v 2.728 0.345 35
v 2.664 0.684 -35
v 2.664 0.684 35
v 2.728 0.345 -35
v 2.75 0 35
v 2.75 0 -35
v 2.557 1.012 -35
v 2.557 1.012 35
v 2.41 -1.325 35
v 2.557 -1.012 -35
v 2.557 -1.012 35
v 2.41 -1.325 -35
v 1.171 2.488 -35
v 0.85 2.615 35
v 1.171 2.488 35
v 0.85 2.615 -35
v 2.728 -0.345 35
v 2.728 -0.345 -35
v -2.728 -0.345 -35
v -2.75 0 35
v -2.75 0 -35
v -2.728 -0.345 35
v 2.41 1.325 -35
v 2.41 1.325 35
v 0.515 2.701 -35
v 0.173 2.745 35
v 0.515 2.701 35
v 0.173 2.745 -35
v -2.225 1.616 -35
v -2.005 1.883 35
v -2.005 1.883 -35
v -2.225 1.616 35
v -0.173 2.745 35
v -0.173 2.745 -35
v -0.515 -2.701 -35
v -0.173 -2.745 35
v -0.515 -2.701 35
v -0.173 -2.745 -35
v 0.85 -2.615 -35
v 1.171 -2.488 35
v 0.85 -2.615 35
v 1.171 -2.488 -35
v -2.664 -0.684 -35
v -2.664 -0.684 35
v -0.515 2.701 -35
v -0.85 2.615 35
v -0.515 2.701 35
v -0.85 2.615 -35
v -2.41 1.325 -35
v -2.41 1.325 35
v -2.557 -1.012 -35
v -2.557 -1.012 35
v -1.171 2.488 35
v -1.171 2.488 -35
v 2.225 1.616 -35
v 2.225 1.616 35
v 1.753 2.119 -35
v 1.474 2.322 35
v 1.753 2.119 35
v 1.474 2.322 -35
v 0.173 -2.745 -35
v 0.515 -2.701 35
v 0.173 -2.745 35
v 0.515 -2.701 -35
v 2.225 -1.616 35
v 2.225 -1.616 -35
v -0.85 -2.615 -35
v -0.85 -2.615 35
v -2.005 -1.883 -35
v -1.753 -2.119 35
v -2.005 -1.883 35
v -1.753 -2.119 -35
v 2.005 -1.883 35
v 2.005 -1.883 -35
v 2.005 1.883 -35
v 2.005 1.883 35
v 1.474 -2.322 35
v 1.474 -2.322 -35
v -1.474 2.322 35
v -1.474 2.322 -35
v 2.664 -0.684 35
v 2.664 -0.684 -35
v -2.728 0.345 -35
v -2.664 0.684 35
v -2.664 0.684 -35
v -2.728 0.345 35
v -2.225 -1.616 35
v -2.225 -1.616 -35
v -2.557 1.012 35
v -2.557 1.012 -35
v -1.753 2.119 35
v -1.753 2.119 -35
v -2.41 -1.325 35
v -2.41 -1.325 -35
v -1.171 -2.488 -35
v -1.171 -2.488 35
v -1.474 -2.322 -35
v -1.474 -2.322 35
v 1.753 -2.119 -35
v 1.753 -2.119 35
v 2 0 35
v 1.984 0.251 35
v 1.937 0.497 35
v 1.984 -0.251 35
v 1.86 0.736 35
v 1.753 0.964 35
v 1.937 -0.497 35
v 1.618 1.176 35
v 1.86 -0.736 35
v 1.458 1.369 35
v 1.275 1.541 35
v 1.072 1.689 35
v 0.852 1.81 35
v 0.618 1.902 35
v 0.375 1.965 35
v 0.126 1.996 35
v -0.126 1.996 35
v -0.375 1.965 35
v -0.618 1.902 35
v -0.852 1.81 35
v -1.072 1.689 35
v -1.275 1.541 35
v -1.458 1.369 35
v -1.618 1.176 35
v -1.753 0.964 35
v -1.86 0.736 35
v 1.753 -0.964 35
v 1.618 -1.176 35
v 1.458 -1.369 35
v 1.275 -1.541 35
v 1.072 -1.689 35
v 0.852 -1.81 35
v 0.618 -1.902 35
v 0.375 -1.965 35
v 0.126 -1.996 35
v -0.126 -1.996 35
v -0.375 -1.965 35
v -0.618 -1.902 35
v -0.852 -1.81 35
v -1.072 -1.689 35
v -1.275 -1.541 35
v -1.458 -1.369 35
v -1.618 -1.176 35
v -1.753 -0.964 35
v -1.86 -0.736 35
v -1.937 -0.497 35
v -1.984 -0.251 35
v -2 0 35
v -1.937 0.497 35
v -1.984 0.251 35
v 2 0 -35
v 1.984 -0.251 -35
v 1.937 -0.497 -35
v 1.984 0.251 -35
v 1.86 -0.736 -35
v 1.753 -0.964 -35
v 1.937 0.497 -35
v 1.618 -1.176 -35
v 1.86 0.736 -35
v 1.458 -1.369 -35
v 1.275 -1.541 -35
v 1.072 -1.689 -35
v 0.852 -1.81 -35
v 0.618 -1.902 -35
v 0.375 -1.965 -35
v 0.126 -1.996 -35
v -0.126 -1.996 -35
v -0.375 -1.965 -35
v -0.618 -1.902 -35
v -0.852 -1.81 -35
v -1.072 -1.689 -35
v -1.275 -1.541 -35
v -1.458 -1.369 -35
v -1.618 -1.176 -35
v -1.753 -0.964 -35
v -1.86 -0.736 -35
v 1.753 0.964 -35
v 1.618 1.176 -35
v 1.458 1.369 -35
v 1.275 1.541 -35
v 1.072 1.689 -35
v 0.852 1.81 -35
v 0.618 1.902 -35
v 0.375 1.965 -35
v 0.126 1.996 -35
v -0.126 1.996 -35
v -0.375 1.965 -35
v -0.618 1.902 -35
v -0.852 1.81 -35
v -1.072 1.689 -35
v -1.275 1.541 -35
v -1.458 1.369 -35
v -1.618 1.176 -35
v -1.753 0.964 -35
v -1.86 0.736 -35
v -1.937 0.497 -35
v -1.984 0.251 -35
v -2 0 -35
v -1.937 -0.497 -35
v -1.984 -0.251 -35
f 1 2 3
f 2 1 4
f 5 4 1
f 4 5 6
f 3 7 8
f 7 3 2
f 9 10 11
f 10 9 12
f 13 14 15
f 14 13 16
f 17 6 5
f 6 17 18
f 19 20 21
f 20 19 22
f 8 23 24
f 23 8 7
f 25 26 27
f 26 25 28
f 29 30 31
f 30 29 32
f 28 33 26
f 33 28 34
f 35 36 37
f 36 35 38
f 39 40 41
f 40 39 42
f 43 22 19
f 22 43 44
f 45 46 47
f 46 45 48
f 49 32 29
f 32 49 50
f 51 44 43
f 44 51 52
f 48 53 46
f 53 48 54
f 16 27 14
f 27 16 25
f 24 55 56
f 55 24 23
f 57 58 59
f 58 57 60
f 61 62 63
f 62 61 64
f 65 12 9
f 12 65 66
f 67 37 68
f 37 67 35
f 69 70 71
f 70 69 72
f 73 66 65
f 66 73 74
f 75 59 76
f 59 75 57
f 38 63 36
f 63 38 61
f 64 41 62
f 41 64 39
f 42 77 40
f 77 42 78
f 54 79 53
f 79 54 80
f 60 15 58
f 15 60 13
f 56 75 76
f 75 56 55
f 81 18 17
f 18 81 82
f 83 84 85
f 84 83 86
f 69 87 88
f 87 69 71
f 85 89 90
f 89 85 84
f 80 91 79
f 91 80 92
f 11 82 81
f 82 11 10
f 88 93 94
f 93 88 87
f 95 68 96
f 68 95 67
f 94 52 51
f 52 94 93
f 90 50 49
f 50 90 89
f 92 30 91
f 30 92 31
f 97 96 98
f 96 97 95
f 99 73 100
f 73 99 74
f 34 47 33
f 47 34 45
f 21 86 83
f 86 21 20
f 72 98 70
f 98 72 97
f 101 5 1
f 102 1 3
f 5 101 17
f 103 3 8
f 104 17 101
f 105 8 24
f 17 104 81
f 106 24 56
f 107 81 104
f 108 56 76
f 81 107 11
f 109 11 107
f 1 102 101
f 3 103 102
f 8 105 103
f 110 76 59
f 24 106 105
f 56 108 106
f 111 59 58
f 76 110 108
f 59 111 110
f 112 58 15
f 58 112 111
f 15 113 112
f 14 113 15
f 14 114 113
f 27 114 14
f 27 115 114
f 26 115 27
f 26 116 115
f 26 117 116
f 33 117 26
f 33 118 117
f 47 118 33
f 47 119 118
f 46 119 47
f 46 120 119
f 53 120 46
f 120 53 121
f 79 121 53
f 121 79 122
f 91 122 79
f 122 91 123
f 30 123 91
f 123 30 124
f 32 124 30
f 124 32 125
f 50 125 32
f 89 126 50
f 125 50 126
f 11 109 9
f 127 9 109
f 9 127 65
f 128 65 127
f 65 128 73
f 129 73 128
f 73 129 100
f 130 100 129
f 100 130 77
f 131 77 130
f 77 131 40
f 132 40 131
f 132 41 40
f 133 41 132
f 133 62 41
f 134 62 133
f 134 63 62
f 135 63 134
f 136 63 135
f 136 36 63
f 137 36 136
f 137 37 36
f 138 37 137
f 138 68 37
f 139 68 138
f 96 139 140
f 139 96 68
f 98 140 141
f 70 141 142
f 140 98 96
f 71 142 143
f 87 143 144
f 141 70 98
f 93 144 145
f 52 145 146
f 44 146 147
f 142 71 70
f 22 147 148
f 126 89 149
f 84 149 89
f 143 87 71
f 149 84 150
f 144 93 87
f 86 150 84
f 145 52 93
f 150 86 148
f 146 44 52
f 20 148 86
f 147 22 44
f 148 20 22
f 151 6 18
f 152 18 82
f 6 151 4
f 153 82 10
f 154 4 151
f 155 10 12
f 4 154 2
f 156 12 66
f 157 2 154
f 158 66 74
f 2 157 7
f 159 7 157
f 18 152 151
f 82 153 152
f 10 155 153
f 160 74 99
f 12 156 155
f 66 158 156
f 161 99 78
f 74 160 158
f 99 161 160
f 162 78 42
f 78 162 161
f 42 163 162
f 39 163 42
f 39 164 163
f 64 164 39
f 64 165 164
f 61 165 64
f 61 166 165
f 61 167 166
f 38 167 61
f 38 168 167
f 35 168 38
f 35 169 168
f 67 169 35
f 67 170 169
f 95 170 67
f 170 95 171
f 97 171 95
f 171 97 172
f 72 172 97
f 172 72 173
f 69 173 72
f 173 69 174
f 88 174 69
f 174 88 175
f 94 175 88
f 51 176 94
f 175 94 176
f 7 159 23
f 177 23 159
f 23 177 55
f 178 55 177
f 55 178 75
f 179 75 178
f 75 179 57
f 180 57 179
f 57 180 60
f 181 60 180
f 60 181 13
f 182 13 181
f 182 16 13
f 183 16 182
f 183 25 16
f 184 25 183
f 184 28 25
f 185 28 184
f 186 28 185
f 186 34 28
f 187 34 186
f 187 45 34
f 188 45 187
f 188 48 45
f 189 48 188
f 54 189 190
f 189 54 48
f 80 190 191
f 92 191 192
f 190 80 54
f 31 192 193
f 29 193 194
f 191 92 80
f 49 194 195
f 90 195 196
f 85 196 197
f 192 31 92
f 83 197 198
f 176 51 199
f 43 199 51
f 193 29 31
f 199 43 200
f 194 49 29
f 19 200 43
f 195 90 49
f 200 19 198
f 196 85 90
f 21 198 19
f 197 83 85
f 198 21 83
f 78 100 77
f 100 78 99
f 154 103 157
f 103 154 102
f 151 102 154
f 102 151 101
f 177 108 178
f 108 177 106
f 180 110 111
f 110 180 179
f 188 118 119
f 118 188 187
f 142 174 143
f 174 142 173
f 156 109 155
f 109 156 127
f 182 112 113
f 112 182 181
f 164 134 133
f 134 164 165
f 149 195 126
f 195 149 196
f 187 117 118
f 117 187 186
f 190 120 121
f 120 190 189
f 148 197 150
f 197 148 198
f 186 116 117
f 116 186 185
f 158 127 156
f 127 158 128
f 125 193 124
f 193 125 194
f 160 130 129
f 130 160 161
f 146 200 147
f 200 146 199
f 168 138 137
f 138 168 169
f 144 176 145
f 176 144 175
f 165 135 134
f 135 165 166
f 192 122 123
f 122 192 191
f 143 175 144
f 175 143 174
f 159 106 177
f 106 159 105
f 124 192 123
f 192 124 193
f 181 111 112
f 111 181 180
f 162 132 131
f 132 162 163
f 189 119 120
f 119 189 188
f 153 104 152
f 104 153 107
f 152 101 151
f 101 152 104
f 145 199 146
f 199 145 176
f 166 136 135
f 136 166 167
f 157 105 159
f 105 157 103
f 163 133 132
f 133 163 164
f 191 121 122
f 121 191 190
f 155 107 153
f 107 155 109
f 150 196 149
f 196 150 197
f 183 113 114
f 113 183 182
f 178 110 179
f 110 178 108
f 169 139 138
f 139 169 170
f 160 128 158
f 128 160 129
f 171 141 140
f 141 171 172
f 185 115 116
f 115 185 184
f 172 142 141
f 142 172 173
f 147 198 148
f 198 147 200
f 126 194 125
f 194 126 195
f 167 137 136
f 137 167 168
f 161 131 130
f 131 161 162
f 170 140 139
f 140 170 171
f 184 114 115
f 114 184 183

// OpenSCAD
$fn = 50;


difference() {
	union() {
		translate(v = [0, 0, -35.0000000000]) {
			cylinder(h = 70, r = 2.7500000000);
		}
	}
	union() {
		translate(v = [0, 0, -100.0000000000]) {
			cylinder(h = 200, r = 2.0000000000);
		}
	}
}
